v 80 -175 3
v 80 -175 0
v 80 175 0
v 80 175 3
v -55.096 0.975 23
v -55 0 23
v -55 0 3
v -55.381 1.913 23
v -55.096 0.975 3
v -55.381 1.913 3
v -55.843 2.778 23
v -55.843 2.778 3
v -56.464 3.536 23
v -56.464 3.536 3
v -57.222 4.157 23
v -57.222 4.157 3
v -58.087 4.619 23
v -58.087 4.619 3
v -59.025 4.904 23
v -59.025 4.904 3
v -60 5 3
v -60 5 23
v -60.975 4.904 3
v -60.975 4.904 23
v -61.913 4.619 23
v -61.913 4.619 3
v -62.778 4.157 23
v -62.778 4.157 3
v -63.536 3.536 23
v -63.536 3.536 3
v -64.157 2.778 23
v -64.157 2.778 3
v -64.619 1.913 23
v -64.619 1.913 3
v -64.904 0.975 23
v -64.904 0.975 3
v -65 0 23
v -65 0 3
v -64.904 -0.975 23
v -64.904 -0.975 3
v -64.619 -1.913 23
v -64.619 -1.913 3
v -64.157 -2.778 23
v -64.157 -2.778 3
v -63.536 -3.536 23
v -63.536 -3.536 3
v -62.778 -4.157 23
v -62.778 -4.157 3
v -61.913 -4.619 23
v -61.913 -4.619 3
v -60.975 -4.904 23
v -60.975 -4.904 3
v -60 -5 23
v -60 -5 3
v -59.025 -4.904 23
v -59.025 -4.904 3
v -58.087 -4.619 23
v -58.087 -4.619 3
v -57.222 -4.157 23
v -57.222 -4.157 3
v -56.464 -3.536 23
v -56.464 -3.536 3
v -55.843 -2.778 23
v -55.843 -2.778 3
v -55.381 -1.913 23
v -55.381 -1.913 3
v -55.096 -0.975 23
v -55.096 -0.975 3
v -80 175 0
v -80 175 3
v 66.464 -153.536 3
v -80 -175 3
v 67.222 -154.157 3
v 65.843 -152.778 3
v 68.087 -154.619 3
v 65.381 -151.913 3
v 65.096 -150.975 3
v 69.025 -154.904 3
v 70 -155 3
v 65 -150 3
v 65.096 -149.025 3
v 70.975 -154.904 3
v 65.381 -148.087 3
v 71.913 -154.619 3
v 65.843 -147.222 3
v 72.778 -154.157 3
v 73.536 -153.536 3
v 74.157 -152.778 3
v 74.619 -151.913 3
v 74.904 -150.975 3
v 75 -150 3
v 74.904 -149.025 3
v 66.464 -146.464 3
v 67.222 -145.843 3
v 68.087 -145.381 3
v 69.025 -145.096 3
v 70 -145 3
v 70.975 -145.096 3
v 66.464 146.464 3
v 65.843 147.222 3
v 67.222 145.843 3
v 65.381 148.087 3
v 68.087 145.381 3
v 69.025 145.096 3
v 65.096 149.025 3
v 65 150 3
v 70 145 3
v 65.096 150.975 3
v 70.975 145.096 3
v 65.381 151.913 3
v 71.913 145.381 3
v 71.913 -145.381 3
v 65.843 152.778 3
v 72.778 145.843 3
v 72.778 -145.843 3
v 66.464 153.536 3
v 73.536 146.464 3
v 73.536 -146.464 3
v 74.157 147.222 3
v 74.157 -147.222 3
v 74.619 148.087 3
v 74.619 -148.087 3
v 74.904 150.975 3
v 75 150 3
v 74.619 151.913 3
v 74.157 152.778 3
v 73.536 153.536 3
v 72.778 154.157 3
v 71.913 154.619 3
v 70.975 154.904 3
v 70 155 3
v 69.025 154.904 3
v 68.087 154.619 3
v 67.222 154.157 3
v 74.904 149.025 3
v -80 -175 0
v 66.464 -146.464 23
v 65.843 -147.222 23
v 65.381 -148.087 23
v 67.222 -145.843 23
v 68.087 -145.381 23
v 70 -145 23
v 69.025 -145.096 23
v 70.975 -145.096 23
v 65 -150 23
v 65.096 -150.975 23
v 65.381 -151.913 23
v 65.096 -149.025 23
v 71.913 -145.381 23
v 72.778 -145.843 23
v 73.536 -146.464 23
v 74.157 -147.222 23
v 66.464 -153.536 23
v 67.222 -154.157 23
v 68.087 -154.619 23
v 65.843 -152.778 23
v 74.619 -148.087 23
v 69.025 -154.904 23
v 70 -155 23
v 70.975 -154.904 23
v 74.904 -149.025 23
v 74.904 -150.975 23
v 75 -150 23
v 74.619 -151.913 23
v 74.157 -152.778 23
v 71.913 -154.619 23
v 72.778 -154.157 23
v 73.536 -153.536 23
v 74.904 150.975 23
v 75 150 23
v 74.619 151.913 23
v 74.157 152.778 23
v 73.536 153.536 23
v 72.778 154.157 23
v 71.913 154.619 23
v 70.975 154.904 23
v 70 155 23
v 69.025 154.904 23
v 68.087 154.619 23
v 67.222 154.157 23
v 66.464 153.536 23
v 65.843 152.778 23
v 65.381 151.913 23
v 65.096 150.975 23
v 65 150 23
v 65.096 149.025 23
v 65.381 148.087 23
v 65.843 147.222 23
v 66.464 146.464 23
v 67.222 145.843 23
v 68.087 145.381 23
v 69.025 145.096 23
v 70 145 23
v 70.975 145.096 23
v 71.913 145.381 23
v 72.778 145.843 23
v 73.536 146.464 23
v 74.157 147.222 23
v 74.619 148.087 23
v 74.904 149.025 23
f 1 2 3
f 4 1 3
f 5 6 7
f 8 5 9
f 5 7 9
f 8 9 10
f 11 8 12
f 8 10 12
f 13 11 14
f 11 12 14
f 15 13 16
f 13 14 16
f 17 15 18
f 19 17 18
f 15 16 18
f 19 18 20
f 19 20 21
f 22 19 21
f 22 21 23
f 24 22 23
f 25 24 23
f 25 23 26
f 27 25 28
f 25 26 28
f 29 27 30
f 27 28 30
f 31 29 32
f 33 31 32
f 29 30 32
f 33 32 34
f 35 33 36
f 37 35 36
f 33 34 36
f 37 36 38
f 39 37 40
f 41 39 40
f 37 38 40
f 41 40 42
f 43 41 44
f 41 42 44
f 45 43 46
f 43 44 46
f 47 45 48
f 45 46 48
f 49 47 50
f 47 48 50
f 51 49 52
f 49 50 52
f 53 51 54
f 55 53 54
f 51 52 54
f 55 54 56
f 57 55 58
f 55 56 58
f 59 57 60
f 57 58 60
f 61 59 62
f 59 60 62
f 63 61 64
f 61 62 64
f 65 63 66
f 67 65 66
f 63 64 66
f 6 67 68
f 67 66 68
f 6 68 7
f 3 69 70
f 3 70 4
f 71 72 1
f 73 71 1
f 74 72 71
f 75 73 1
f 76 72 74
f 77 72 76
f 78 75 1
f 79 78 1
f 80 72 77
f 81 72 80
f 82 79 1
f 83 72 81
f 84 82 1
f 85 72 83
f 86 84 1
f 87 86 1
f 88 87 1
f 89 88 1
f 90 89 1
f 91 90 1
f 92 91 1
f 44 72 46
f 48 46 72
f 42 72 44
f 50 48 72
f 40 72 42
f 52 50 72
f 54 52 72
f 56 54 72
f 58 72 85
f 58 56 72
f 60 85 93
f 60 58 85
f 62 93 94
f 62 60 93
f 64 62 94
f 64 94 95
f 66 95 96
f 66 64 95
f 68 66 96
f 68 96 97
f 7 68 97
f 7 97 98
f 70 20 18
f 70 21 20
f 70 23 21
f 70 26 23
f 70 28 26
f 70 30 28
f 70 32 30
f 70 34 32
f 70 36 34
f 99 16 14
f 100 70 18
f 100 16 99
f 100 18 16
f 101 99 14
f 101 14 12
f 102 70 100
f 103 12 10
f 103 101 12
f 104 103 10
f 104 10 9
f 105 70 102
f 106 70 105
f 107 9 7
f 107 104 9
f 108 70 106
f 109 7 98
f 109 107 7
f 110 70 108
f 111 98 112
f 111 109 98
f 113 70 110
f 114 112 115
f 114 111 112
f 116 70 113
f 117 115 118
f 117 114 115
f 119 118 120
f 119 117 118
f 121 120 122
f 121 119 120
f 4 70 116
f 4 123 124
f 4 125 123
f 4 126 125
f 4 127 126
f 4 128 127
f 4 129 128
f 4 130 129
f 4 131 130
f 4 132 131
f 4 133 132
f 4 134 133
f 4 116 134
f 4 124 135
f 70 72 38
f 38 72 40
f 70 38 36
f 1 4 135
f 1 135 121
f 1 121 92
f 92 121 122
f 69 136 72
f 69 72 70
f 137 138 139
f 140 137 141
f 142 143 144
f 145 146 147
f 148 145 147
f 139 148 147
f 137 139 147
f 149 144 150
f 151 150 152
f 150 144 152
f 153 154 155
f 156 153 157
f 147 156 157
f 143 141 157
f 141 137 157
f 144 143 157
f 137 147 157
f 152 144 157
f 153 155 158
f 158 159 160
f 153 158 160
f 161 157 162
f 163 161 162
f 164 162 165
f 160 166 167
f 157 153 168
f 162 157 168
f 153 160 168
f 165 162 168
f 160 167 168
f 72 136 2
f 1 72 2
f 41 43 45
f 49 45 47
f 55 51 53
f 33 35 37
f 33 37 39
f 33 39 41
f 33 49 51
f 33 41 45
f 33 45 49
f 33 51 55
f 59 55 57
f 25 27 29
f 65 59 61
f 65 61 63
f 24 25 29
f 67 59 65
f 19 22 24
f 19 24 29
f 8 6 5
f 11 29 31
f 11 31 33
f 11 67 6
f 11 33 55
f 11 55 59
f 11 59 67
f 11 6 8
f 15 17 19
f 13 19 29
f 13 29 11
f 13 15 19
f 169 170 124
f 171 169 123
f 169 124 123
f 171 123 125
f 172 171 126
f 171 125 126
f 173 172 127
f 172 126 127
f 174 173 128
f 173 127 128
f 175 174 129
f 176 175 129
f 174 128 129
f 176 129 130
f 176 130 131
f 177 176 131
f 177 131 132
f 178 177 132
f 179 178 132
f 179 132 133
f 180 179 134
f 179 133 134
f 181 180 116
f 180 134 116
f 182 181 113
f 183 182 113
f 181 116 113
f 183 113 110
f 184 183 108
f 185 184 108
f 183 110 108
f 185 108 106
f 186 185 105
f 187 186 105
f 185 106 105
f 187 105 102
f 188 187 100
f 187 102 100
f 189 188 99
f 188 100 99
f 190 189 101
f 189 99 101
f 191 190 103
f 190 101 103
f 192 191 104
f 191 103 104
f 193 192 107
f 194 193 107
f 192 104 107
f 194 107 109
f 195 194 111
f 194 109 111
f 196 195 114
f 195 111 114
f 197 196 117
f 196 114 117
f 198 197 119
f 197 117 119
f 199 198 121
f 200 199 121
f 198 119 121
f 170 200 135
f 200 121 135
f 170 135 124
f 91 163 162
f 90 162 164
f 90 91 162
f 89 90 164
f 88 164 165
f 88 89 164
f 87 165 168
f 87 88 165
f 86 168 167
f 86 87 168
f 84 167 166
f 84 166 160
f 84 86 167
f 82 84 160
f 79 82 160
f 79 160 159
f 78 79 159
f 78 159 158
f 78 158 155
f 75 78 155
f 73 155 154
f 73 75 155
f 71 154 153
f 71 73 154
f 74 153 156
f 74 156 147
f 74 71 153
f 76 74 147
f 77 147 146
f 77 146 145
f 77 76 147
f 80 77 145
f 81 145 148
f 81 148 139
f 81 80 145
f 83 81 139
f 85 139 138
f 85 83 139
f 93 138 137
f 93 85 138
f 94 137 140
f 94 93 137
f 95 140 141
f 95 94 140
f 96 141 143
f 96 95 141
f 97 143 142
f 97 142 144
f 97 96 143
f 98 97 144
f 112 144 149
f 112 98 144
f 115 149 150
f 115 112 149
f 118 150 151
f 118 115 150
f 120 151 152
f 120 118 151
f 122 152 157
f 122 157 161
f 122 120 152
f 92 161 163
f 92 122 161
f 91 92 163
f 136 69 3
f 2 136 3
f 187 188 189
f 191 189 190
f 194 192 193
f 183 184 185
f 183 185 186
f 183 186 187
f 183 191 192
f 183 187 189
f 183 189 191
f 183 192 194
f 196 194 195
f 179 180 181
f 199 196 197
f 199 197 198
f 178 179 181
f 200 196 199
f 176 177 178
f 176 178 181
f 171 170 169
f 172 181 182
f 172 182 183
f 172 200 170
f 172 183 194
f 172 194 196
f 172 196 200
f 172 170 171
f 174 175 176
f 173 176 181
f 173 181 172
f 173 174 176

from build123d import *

# Parameters (mm, degrees)
SKETCH1_W           = 160
SKETCH1_H           = 350
BOSS_EXTRUDE1_DEPTH = 3
SKETCH2_R           = 5
BOSS_EXTRUDE2_DEPTH = 20
SKETCH3_R           = 5
BOSS_EXTRUDE3_DEPTH = 20


with BuildPart() as part:
    # Sketch1 → Boss-Extrude1 (new body)
    with BuildSketch(Plane.XY):
        Rectangle(SKETCH1_W, SKETCH1_H)
    extrude(amount=BOSS_EXTRUDE1_DEPTH)

    # Sketch2 → Boss-Extrude2 (add)
    with BuildSketch(Plane.XY.offset(3)):
        with Locations((70, 150)):
            Circle(SKETCH2_R)
    boss_extrude2 = extrude(amount=BOSS_EXTRUDE2_DEPTH)

    # Mirror1: Boss-Extrude2 across plane
    add(boss_extrude2.mirror(Plane.ZX))

    # Sketch3 → Boss-Extrude3 (add)
    with BuildSketch(Plane.XY.offset(3)):
        with Locations((-60, 0)):
            Circle(SKETCH3_R)
    extrude(amount=BOSS_EXTRUDE3_DEPTH)


solid = part.part
